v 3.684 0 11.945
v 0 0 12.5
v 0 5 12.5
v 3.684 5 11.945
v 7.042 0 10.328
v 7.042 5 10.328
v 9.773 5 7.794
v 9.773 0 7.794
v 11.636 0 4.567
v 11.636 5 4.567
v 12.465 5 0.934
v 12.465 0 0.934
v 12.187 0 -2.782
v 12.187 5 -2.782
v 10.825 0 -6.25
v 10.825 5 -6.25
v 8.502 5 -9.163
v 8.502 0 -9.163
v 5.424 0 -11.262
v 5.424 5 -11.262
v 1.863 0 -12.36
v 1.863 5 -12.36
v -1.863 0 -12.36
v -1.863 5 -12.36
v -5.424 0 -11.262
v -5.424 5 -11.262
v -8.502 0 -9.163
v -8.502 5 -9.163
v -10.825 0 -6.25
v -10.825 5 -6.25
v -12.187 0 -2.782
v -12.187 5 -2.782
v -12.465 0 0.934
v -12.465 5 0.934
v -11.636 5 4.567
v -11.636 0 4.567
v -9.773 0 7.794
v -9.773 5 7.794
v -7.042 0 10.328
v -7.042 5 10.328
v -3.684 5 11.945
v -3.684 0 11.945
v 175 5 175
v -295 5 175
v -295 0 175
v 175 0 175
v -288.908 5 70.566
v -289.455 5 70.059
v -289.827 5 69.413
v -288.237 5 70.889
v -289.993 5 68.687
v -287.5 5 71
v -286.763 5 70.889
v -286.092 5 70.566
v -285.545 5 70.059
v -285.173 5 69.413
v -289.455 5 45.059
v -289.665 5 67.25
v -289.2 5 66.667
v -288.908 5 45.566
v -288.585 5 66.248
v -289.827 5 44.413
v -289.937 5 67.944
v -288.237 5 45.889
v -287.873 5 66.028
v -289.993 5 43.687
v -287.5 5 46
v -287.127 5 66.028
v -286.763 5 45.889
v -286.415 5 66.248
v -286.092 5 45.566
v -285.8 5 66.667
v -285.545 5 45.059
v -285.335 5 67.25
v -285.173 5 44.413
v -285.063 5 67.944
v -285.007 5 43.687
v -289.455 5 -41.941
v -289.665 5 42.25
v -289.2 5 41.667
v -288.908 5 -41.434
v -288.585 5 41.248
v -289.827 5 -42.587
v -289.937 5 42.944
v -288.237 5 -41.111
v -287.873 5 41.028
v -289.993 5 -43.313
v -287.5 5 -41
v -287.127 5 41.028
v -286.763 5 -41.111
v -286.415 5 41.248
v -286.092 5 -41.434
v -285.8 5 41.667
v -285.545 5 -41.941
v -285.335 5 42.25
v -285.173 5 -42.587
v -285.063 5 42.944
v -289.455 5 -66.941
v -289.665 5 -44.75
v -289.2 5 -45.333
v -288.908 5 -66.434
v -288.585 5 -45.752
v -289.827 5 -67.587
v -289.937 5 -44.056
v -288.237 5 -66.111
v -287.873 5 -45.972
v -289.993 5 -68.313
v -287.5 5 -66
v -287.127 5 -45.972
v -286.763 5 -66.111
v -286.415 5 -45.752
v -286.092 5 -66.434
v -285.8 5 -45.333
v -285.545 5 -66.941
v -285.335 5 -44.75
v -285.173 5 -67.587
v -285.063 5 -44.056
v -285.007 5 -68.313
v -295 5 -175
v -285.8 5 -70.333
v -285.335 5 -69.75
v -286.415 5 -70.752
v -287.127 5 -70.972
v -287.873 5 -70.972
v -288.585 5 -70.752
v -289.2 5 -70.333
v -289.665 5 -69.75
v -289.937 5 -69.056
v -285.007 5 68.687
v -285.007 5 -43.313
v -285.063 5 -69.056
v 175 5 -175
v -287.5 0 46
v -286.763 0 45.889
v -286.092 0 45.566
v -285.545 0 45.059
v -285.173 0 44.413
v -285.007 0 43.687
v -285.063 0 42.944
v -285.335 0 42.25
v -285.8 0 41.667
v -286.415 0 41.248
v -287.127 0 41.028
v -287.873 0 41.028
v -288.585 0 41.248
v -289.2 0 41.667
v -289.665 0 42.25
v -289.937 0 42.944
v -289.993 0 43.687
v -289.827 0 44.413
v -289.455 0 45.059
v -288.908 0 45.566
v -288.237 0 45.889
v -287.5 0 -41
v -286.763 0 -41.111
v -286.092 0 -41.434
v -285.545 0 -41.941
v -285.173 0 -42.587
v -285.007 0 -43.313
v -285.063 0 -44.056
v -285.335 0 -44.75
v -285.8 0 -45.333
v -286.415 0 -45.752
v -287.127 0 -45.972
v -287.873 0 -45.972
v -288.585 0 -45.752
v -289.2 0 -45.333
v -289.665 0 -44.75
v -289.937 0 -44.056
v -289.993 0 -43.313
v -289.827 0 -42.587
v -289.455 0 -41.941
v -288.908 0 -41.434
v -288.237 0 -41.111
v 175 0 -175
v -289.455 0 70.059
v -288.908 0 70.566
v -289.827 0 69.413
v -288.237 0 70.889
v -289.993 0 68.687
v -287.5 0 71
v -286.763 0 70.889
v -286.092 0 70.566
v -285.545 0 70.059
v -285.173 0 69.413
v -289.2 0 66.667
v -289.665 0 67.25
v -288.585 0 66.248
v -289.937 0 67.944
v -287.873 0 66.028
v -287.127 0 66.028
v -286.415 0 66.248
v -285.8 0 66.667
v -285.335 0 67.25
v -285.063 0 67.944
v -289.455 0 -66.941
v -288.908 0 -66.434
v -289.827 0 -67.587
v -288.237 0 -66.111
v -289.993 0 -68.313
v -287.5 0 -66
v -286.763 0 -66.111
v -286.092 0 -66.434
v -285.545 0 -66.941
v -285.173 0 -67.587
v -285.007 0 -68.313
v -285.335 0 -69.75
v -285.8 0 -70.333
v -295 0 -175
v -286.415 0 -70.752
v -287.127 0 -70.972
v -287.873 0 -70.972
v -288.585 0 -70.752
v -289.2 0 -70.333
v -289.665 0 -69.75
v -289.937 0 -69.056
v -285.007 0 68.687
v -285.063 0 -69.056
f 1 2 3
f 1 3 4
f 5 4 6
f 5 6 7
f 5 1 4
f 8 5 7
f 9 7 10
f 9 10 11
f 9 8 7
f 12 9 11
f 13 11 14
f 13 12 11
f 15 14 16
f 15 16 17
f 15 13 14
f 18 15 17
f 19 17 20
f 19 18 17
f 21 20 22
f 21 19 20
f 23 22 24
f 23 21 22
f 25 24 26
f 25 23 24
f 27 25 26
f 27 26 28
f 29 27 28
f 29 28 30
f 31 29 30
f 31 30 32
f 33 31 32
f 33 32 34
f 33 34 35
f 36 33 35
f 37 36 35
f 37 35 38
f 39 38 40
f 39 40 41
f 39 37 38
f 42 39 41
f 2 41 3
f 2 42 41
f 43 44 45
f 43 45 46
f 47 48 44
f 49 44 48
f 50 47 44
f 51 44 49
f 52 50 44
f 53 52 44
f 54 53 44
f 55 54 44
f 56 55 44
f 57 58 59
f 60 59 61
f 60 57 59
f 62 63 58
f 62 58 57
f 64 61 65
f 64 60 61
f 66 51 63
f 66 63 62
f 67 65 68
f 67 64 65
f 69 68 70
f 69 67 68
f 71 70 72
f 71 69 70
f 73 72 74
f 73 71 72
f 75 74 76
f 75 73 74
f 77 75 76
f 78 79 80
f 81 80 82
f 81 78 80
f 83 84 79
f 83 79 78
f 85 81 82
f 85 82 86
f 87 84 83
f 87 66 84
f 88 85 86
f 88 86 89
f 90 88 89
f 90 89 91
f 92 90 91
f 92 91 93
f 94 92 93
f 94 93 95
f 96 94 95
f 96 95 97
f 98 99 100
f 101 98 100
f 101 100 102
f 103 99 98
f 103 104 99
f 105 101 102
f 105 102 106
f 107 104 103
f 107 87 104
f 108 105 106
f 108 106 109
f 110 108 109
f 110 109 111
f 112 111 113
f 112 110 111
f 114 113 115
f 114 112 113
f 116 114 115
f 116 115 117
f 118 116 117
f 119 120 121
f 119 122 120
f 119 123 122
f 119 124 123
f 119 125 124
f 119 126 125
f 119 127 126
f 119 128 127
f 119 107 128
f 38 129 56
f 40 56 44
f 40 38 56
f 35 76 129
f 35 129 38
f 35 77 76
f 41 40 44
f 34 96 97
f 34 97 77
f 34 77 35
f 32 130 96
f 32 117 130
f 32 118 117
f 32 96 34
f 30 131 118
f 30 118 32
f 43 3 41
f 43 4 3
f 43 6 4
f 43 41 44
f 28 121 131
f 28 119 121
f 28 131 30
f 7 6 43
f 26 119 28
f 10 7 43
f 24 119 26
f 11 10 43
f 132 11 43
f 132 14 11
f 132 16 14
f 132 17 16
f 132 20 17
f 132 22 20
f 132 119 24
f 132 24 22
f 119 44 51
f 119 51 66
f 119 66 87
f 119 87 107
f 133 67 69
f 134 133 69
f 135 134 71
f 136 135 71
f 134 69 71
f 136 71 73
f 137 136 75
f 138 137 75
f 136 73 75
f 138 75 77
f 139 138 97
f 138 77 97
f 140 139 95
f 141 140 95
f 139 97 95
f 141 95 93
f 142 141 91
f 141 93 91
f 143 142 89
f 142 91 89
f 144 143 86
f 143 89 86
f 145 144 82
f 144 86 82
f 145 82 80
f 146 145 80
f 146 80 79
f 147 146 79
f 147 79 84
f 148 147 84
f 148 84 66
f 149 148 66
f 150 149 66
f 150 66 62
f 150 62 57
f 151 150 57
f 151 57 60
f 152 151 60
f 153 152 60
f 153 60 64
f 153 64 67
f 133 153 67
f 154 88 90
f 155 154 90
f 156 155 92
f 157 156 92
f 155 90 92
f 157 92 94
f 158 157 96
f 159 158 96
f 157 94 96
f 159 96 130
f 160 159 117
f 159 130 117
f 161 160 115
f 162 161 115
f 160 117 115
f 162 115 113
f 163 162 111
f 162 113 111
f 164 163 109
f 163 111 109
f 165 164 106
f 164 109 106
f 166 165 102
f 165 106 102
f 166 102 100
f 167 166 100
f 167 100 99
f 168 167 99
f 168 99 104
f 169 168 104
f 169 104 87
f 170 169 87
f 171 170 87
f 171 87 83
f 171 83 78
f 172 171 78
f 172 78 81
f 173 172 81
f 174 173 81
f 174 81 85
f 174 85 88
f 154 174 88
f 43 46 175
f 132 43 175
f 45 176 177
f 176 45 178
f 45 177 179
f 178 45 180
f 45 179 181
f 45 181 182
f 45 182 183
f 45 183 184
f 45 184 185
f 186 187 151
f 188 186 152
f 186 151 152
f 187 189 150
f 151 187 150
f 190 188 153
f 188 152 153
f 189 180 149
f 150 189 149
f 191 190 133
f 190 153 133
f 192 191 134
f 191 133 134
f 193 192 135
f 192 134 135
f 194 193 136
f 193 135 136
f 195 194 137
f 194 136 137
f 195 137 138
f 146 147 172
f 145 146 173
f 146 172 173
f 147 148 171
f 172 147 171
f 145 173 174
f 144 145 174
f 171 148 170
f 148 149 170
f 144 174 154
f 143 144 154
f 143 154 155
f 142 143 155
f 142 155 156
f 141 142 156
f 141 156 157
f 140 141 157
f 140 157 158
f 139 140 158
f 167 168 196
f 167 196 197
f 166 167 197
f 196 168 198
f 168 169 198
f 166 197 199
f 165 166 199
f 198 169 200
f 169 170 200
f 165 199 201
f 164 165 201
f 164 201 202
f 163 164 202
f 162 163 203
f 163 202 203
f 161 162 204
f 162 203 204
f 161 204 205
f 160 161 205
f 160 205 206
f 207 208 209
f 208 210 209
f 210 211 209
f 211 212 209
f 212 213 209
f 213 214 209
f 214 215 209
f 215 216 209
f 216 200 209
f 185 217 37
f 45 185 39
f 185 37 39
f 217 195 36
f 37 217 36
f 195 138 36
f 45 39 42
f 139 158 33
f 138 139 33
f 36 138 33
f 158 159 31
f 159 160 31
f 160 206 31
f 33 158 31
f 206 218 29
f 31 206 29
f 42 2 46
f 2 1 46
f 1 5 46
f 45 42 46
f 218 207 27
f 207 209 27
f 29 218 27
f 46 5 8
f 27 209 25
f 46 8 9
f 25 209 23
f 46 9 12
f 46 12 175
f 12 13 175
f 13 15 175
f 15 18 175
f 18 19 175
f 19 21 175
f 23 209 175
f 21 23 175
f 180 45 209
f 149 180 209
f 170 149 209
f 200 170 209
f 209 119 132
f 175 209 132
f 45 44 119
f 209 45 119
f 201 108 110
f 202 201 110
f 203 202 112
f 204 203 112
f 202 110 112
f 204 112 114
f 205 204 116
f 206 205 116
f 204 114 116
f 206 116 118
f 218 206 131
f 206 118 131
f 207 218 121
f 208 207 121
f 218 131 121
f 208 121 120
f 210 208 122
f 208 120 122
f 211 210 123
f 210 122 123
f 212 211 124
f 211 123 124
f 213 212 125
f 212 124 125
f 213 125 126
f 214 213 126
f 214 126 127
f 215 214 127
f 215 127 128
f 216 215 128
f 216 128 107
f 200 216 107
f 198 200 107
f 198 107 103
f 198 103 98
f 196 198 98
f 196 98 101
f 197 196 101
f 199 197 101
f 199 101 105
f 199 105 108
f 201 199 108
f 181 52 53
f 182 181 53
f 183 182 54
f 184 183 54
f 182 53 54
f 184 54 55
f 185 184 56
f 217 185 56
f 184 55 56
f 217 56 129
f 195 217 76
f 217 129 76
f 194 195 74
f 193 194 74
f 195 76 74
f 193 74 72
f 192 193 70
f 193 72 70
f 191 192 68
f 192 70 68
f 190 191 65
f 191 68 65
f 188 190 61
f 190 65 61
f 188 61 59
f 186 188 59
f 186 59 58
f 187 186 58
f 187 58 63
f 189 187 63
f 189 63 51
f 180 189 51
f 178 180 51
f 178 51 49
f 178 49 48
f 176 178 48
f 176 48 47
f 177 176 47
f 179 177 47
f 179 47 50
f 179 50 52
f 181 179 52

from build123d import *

# Parameters (mm, degrees)
SKETCH6_W           = 350
SKETCH6_H           = 350
SKETCH6_R           = 12.5
BOSS_EXTRUDE1_DEPTH = 5
SKETCH7_W           = 120
SKETCH7_H           = 350
BOSS_EXTRUDE2_DEPTH = 5
SKETCH8_R           = 2.5
CUT_EXTRUDE1_DEPTH  = 10


with BuildPart() as part:
    # Sketch6 → Boss-Extrude1 (new body)
    with BuildSketch(Plane(origin=(0, 0, 0), x_dir=(1, 0, 0), z_dir=(0, 1, 0))):
        Rectangle(SKETCH6_W, SKETCH6_H)
        with Locations(Location((0, 0, 0), (0, 0, 270))):
            Circle(SKETCH6_R, mode=Mode.SUBTRACT)
    extrude(amount=BOSS_EXTRUDE1_DEPTH)

    # Sketch7 → Boss-Extrude2 (add)
    with BuildSketch(Plane(origin=(0, 5, 0), x_dir=(1, 0, 0), z_dir=(0, 1, 0))):
        with Locations((-235, 0)):
            Rectangle(SKETCH7_W, SKETCH7_H)
    extrude(amount=-BOSS_EXTRUDE2_DEPTH)

    # Sketch8 → Cut-Extrude1 (cut)
    with BuildSketch(Plane(origin=(0, 5, 0), x_dir=(1, 0, 0), z_dir=(0, 1, 0))):
        with Locations(Location((-287.5, -43.500000153, 0), (0, 0, 270))):
            Circle(SKETCH8_R)
        with Locations(Location((-287.5, -68.500000153, 0), (0, 0, 270))):
            Circle(SKETCH8_R)
        with Locations(Location((-287.5, 68.500000153, 0), (0, 0, 270))):
            Circle(SKETCH8_R)
        with Locations(Location((-287.5, 43.500000153, 0), (0, 0, 270))):
            Circle(SKETCH8_R)
    extrude(amount=-CUT_EXTRUDE1_DEPTH, mode=Mode.SUBTRACT)


solid = part.part
